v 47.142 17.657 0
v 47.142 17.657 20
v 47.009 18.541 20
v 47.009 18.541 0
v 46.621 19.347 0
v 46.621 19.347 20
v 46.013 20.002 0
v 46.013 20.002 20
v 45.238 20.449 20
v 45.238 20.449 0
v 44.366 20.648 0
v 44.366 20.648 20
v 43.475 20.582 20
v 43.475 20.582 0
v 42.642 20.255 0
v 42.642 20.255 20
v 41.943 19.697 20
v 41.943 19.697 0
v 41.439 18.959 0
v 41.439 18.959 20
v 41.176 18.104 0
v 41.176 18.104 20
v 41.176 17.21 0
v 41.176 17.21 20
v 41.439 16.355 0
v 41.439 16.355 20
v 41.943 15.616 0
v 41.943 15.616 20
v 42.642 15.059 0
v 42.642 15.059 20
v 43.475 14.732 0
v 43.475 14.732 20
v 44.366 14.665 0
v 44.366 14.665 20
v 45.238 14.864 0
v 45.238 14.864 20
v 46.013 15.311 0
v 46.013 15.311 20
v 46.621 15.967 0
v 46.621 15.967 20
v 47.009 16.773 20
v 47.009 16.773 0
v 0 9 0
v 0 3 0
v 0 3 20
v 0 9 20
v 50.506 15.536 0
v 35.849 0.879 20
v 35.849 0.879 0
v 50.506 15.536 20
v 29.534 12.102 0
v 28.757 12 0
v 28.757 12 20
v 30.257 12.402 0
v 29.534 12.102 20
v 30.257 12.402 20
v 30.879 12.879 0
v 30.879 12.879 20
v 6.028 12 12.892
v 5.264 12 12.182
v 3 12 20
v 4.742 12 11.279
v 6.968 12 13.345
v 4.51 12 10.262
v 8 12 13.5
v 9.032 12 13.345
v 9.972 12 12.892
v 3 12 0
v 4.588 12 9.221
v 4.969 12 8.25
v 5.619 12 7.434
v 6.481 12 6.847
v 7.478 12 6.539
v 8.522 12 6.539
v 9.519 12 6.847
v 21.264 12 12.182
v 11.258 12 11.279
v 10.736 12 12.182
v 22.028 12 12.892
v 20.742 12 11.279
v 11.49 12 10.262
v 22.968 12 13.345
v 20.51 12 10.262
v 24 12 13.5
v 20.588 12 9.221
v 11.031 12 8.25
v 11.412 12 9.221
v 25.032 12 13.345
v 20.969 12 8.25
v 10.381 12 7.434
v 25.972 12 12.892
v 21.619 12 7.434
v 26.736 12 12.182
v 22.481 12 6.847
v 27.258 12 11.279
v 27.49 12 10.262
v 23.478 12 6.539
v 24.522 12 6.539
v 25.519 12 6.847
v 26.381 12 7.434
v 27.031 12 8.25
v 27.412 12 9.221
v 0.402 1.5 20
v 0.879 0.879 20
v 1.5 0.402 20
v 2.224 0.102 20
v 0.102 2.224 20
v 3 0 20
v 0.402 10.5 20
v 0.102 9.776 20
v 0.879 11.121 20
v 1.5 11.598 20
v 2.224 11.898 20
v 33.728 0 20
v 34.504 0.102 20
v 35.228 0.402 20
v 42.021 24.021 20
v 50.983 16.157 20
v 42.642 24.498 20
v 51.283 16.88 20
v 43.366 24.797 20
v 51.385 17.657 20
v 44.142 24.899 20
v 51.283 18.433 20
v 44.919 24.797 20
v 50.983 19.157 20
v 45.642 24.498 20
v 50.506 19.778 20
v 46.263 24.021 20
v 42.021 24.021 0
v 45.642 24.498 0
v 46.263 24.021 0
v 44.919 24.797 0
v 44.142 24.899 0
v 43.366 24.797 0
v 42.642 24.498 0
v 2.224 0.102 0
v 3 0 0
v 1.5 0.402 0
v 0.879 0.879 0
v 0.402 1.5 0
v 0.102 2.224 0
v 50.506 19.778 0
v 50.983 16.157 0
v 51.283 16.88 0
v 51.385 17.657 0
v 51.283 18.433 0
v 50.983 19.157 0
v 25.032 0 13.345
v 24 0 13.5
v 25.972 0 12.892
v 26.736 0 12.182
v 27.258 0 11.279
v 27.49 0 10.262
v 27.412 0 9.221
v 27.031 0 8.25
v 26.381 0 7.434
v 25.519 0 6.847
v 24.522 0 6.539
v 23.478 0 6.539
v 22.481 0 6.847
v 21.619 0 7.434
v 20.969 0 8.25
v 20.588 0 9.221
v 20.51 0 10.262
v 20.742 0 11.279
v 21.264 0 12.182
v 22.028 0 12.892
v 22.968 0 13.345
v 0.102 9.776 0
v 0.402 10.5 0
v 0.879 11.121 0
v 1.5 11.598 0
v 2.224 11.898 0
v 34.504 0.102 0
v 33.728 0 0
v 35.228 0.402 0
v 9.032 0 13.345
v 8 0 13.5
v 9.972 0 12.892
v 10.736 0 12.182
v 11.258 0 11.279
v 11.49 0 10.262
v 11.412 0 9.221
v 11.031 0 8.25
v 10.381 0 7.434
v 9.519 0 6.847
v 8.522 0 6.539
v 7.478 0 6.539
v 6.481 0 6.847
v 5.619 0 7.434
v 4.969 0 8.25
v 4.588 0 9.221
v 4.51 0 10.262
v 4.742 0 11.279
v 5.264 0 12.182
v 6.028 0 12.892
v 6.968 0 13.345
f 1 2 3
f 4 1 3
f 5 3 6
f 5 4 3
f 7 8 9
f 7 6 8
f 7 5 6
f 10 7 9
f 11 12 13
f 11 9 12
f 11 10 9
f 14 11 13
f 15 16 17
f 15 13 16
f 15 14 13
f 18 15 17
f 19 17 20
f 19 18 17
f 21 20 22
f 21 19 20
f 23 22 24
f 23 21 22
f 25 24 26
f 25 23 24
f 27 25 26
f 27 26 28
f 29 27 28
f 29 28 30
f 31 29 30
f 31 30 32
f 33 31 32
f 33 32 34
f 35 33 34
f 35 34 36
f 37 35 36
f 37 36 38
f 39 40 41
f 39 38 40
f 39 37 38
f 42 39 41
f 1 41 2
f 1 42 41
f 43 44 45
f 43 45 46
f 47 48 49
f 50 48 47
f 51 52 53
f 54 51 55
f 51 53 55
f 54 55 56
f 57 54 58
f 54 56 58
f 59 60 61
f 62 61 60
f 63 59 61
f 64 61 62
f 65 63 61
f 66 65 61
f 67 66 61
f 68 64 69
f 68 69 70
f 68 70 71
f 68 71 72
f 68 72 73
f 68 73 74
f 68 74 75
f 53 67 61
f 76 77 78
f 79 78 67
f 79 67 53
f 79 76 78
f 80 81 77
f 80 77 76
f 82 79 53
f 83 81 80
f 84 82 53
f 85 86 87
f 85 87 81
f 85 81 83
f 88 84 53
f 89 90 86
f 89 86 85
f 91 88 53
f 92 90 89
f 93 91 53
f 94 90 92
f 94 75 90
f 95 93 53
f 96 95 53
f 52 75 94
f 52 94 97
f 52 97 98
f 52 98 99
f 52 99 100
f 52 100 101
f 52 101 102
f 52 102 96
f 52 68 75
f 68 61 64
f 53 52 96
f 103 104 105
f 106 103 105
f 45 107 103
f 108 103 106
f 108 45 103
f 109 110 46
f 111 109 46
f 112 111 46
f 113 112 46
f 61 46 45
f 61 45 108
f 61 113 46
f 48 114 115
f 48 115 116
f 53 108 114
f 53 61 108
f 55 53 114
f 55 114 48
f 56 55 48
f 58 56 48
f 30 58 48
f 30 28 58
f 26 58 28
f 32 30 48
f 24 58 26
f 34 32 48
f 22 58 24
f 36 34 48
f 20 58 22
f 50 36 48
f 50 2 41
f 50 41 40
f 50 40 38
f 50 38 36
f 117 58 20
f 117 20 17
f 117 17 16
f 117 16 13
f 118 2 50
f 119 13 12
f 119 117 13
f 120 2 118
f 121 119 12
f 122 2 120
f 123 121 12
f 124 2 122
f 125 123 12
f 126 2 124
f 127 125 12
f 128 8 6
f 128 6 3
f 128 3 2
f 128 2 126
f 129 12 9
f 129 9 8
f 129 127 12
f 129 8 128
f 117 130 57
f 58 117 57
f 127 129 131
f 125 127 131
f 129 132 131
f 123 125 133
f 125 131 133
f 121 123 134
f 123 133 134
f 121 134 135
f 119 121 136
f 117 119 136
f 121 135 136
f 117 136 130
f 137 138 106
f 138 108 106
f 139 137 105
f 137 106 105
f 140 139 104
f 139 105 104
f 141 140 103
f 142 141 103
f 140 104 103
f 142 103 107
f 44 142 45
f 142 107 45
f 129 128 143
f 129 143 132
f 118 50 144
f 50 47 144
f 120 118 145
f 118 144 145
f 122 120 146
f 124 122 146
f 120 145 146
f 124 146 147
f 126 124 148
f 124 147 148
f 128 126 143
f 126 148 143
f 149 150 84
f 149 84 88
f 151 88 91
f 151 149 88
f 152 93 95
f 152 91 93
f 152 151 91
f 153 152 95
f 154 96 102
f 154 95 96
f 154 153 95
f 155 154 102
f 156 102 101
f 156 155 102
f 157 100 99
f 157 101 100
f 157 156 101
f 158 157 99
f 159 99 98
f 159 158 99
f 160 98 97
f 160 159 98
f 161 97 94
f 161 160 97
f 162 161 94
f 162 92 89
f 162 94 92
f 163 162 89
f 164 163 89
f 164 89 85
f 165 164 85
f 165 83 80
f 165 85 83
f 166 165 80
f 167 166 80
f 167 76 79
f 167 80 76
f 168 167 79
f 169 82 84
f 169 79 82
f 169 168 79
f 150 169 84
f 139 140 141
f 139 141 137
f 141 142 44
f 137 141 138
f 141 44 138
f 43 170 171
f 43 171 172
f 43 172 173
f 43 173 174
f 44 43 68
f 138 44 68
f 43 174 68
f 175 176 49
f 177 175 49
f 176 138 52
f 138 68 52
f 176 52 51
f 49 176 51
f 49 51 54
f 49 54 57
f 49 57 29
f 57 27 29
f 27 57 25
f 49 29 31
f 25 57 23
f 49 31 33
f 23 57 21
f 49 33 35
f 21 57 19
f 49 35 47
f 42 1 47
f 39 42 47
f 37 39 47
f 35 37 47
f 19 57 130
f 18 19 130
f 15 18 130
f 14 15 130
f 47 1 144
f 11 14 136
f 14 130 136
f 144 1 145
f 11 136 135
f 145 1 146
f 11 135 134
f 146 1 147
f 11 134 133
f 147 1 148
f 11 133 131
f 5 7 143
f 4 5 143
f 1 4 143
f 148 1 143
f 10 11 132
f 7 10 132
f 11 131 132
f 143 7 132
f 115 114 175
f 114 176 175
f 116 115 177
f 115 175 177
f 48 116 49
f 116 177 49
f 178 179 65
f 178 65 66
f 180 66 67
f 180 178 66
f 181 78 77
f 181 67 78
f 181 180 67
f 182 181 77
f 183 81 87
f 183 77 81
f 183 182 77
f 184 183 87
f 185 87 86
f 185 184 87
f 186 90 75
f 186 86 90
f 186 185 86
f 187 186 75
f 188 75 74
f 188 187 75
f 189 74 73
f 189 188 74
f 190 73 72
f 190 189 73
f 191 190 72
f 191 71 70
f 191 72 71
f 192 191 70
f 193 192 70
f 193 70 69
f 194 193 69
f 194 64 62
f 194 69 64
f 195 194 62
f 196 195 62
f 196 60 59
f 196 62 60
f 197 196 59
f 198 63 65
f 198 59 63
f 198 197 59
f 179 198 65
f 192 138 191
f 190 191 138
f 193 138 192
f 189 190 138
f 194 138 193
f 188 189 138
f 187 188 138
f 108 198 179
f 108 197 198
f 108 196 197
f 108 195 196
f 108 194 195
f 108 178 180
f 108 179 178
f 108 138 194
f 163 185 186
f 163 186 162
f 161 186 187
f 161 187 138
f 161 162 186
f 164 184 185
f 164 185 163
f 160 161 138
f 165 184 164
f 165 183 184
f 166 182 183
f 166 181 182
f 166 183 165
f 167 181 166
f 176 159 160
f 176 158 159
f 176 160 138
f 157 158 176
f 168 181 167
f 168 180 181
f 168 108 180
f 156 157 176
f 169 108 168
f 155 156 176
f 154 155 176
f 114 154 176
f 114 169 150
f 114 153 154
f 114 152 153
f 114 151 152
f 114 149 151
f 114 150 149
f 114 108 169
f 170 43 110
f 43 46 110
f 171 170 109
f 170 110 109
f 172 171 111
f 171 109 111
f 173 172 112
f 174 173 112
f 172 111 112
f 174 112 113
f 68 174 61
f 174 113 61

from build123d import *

# Parameters (mm, degrees)
ESQUISSE1_W                  = 30
ESQUISSE1_H                  = 12
BOSS_EXTRU_1_DEPTH           = 20
BOSS_EXTRU_2_DEPTH           = 20
ENL_V_MAT_EXTRU_1_DEPTH      = 59.048643566
ENL_V_MAT_EXTRU_1_DEPTH_BACK = 59.048643566
ESQUISSE3_R                  = 3.5
ENL_V_MAT_EXTRU_2_DEPTH      = 63.072991509
ENL_V_MAT_EXTRU_2_DEPTH_BACK = 63.072991509
ESQUISSE4_R                  = 3
CONG_1_R                     = 3


with BuildPart() as part:
    # Esquisse1 → Boss.-Extru.1 (new body)
    with BuildSketch(Plane.XY):
        with Locations((15, 6)):
            Rectangle(ESQUISSE1_W, ESQUISSE1_H)
    extrude(amount=BOSS_EXTRU_1_DEPTH)

    # Esquisse2 → Boss.-Extru.2 (add)
    with BuildSketch(Plane.XY.offset(20)):
        Polygon((30, 0), (34.970562748, 0), (52.627416998, 17.656854249), (44.142135624, 26.142135624), (30, 12), align=None)
    extrude(amount=-BOSS_EXTRU_2_DEPTH)

    # Esquisse3 → Enlèv. mat.-Extru.1 (cut, two sides: drawn at the far end of the back side and taken through both)
    with BuildSketch(Plane(origin=(0, 12, 0), x_dir=(1, 0, 0), z_dir=(0, 1, 0)).offset(-ENL_V_MAT_EXTRU_1_DEPTH_BACK)):
        with Locations(Location((8, -10, 0), (0, 0, 270))):
            Circle(ESQUISSE3_R)
        with Locations(Location((24, -10, 0), (0, 0, 270))):
            Circle(ESQUISSE3_R)
    extrude(amount=ENL_V_MAT_EXTRU_1_DEPTH + ENL_V_MAT_EXTRU_1_DEPTH_BACK, mode=Mode.SUBTRACT)

    # Esquisse4 → Enlèv. mat.-Extru.2 (cut, two sides: drawn at the far end of the back side and taken through both)
    with BuildSketch(Plane.XY.offset(20).offset(-ENL_V_MAT_EXTRU_2_DEPTH_BACK)):
        with Locations((44.142135624, 17.656854249)):
            Circle(ESQUISSE4_R)
    extrude(amount=ENL_V_MAT_EXTRU_2_DEPTH + ENL_V_MAT_EXTRU_2_DEPTH_BACK, mode=Mode.SUBTRACT)

    # Congé1
    cong_1_edges = [part.edges().sort_by_distance(p)[0] for p in [
        (44.142135624, 26.142135624, 10),
        (52.627416998, 17.656854249, 10),
        (34.970562748, 0, 10),
        (0, 12, 10),
        (30, 12, 10),
        (0, 0, 10),
    ]]
    fillet(cong_1_edges, radius=CONG_1_R)


solid = part.part
